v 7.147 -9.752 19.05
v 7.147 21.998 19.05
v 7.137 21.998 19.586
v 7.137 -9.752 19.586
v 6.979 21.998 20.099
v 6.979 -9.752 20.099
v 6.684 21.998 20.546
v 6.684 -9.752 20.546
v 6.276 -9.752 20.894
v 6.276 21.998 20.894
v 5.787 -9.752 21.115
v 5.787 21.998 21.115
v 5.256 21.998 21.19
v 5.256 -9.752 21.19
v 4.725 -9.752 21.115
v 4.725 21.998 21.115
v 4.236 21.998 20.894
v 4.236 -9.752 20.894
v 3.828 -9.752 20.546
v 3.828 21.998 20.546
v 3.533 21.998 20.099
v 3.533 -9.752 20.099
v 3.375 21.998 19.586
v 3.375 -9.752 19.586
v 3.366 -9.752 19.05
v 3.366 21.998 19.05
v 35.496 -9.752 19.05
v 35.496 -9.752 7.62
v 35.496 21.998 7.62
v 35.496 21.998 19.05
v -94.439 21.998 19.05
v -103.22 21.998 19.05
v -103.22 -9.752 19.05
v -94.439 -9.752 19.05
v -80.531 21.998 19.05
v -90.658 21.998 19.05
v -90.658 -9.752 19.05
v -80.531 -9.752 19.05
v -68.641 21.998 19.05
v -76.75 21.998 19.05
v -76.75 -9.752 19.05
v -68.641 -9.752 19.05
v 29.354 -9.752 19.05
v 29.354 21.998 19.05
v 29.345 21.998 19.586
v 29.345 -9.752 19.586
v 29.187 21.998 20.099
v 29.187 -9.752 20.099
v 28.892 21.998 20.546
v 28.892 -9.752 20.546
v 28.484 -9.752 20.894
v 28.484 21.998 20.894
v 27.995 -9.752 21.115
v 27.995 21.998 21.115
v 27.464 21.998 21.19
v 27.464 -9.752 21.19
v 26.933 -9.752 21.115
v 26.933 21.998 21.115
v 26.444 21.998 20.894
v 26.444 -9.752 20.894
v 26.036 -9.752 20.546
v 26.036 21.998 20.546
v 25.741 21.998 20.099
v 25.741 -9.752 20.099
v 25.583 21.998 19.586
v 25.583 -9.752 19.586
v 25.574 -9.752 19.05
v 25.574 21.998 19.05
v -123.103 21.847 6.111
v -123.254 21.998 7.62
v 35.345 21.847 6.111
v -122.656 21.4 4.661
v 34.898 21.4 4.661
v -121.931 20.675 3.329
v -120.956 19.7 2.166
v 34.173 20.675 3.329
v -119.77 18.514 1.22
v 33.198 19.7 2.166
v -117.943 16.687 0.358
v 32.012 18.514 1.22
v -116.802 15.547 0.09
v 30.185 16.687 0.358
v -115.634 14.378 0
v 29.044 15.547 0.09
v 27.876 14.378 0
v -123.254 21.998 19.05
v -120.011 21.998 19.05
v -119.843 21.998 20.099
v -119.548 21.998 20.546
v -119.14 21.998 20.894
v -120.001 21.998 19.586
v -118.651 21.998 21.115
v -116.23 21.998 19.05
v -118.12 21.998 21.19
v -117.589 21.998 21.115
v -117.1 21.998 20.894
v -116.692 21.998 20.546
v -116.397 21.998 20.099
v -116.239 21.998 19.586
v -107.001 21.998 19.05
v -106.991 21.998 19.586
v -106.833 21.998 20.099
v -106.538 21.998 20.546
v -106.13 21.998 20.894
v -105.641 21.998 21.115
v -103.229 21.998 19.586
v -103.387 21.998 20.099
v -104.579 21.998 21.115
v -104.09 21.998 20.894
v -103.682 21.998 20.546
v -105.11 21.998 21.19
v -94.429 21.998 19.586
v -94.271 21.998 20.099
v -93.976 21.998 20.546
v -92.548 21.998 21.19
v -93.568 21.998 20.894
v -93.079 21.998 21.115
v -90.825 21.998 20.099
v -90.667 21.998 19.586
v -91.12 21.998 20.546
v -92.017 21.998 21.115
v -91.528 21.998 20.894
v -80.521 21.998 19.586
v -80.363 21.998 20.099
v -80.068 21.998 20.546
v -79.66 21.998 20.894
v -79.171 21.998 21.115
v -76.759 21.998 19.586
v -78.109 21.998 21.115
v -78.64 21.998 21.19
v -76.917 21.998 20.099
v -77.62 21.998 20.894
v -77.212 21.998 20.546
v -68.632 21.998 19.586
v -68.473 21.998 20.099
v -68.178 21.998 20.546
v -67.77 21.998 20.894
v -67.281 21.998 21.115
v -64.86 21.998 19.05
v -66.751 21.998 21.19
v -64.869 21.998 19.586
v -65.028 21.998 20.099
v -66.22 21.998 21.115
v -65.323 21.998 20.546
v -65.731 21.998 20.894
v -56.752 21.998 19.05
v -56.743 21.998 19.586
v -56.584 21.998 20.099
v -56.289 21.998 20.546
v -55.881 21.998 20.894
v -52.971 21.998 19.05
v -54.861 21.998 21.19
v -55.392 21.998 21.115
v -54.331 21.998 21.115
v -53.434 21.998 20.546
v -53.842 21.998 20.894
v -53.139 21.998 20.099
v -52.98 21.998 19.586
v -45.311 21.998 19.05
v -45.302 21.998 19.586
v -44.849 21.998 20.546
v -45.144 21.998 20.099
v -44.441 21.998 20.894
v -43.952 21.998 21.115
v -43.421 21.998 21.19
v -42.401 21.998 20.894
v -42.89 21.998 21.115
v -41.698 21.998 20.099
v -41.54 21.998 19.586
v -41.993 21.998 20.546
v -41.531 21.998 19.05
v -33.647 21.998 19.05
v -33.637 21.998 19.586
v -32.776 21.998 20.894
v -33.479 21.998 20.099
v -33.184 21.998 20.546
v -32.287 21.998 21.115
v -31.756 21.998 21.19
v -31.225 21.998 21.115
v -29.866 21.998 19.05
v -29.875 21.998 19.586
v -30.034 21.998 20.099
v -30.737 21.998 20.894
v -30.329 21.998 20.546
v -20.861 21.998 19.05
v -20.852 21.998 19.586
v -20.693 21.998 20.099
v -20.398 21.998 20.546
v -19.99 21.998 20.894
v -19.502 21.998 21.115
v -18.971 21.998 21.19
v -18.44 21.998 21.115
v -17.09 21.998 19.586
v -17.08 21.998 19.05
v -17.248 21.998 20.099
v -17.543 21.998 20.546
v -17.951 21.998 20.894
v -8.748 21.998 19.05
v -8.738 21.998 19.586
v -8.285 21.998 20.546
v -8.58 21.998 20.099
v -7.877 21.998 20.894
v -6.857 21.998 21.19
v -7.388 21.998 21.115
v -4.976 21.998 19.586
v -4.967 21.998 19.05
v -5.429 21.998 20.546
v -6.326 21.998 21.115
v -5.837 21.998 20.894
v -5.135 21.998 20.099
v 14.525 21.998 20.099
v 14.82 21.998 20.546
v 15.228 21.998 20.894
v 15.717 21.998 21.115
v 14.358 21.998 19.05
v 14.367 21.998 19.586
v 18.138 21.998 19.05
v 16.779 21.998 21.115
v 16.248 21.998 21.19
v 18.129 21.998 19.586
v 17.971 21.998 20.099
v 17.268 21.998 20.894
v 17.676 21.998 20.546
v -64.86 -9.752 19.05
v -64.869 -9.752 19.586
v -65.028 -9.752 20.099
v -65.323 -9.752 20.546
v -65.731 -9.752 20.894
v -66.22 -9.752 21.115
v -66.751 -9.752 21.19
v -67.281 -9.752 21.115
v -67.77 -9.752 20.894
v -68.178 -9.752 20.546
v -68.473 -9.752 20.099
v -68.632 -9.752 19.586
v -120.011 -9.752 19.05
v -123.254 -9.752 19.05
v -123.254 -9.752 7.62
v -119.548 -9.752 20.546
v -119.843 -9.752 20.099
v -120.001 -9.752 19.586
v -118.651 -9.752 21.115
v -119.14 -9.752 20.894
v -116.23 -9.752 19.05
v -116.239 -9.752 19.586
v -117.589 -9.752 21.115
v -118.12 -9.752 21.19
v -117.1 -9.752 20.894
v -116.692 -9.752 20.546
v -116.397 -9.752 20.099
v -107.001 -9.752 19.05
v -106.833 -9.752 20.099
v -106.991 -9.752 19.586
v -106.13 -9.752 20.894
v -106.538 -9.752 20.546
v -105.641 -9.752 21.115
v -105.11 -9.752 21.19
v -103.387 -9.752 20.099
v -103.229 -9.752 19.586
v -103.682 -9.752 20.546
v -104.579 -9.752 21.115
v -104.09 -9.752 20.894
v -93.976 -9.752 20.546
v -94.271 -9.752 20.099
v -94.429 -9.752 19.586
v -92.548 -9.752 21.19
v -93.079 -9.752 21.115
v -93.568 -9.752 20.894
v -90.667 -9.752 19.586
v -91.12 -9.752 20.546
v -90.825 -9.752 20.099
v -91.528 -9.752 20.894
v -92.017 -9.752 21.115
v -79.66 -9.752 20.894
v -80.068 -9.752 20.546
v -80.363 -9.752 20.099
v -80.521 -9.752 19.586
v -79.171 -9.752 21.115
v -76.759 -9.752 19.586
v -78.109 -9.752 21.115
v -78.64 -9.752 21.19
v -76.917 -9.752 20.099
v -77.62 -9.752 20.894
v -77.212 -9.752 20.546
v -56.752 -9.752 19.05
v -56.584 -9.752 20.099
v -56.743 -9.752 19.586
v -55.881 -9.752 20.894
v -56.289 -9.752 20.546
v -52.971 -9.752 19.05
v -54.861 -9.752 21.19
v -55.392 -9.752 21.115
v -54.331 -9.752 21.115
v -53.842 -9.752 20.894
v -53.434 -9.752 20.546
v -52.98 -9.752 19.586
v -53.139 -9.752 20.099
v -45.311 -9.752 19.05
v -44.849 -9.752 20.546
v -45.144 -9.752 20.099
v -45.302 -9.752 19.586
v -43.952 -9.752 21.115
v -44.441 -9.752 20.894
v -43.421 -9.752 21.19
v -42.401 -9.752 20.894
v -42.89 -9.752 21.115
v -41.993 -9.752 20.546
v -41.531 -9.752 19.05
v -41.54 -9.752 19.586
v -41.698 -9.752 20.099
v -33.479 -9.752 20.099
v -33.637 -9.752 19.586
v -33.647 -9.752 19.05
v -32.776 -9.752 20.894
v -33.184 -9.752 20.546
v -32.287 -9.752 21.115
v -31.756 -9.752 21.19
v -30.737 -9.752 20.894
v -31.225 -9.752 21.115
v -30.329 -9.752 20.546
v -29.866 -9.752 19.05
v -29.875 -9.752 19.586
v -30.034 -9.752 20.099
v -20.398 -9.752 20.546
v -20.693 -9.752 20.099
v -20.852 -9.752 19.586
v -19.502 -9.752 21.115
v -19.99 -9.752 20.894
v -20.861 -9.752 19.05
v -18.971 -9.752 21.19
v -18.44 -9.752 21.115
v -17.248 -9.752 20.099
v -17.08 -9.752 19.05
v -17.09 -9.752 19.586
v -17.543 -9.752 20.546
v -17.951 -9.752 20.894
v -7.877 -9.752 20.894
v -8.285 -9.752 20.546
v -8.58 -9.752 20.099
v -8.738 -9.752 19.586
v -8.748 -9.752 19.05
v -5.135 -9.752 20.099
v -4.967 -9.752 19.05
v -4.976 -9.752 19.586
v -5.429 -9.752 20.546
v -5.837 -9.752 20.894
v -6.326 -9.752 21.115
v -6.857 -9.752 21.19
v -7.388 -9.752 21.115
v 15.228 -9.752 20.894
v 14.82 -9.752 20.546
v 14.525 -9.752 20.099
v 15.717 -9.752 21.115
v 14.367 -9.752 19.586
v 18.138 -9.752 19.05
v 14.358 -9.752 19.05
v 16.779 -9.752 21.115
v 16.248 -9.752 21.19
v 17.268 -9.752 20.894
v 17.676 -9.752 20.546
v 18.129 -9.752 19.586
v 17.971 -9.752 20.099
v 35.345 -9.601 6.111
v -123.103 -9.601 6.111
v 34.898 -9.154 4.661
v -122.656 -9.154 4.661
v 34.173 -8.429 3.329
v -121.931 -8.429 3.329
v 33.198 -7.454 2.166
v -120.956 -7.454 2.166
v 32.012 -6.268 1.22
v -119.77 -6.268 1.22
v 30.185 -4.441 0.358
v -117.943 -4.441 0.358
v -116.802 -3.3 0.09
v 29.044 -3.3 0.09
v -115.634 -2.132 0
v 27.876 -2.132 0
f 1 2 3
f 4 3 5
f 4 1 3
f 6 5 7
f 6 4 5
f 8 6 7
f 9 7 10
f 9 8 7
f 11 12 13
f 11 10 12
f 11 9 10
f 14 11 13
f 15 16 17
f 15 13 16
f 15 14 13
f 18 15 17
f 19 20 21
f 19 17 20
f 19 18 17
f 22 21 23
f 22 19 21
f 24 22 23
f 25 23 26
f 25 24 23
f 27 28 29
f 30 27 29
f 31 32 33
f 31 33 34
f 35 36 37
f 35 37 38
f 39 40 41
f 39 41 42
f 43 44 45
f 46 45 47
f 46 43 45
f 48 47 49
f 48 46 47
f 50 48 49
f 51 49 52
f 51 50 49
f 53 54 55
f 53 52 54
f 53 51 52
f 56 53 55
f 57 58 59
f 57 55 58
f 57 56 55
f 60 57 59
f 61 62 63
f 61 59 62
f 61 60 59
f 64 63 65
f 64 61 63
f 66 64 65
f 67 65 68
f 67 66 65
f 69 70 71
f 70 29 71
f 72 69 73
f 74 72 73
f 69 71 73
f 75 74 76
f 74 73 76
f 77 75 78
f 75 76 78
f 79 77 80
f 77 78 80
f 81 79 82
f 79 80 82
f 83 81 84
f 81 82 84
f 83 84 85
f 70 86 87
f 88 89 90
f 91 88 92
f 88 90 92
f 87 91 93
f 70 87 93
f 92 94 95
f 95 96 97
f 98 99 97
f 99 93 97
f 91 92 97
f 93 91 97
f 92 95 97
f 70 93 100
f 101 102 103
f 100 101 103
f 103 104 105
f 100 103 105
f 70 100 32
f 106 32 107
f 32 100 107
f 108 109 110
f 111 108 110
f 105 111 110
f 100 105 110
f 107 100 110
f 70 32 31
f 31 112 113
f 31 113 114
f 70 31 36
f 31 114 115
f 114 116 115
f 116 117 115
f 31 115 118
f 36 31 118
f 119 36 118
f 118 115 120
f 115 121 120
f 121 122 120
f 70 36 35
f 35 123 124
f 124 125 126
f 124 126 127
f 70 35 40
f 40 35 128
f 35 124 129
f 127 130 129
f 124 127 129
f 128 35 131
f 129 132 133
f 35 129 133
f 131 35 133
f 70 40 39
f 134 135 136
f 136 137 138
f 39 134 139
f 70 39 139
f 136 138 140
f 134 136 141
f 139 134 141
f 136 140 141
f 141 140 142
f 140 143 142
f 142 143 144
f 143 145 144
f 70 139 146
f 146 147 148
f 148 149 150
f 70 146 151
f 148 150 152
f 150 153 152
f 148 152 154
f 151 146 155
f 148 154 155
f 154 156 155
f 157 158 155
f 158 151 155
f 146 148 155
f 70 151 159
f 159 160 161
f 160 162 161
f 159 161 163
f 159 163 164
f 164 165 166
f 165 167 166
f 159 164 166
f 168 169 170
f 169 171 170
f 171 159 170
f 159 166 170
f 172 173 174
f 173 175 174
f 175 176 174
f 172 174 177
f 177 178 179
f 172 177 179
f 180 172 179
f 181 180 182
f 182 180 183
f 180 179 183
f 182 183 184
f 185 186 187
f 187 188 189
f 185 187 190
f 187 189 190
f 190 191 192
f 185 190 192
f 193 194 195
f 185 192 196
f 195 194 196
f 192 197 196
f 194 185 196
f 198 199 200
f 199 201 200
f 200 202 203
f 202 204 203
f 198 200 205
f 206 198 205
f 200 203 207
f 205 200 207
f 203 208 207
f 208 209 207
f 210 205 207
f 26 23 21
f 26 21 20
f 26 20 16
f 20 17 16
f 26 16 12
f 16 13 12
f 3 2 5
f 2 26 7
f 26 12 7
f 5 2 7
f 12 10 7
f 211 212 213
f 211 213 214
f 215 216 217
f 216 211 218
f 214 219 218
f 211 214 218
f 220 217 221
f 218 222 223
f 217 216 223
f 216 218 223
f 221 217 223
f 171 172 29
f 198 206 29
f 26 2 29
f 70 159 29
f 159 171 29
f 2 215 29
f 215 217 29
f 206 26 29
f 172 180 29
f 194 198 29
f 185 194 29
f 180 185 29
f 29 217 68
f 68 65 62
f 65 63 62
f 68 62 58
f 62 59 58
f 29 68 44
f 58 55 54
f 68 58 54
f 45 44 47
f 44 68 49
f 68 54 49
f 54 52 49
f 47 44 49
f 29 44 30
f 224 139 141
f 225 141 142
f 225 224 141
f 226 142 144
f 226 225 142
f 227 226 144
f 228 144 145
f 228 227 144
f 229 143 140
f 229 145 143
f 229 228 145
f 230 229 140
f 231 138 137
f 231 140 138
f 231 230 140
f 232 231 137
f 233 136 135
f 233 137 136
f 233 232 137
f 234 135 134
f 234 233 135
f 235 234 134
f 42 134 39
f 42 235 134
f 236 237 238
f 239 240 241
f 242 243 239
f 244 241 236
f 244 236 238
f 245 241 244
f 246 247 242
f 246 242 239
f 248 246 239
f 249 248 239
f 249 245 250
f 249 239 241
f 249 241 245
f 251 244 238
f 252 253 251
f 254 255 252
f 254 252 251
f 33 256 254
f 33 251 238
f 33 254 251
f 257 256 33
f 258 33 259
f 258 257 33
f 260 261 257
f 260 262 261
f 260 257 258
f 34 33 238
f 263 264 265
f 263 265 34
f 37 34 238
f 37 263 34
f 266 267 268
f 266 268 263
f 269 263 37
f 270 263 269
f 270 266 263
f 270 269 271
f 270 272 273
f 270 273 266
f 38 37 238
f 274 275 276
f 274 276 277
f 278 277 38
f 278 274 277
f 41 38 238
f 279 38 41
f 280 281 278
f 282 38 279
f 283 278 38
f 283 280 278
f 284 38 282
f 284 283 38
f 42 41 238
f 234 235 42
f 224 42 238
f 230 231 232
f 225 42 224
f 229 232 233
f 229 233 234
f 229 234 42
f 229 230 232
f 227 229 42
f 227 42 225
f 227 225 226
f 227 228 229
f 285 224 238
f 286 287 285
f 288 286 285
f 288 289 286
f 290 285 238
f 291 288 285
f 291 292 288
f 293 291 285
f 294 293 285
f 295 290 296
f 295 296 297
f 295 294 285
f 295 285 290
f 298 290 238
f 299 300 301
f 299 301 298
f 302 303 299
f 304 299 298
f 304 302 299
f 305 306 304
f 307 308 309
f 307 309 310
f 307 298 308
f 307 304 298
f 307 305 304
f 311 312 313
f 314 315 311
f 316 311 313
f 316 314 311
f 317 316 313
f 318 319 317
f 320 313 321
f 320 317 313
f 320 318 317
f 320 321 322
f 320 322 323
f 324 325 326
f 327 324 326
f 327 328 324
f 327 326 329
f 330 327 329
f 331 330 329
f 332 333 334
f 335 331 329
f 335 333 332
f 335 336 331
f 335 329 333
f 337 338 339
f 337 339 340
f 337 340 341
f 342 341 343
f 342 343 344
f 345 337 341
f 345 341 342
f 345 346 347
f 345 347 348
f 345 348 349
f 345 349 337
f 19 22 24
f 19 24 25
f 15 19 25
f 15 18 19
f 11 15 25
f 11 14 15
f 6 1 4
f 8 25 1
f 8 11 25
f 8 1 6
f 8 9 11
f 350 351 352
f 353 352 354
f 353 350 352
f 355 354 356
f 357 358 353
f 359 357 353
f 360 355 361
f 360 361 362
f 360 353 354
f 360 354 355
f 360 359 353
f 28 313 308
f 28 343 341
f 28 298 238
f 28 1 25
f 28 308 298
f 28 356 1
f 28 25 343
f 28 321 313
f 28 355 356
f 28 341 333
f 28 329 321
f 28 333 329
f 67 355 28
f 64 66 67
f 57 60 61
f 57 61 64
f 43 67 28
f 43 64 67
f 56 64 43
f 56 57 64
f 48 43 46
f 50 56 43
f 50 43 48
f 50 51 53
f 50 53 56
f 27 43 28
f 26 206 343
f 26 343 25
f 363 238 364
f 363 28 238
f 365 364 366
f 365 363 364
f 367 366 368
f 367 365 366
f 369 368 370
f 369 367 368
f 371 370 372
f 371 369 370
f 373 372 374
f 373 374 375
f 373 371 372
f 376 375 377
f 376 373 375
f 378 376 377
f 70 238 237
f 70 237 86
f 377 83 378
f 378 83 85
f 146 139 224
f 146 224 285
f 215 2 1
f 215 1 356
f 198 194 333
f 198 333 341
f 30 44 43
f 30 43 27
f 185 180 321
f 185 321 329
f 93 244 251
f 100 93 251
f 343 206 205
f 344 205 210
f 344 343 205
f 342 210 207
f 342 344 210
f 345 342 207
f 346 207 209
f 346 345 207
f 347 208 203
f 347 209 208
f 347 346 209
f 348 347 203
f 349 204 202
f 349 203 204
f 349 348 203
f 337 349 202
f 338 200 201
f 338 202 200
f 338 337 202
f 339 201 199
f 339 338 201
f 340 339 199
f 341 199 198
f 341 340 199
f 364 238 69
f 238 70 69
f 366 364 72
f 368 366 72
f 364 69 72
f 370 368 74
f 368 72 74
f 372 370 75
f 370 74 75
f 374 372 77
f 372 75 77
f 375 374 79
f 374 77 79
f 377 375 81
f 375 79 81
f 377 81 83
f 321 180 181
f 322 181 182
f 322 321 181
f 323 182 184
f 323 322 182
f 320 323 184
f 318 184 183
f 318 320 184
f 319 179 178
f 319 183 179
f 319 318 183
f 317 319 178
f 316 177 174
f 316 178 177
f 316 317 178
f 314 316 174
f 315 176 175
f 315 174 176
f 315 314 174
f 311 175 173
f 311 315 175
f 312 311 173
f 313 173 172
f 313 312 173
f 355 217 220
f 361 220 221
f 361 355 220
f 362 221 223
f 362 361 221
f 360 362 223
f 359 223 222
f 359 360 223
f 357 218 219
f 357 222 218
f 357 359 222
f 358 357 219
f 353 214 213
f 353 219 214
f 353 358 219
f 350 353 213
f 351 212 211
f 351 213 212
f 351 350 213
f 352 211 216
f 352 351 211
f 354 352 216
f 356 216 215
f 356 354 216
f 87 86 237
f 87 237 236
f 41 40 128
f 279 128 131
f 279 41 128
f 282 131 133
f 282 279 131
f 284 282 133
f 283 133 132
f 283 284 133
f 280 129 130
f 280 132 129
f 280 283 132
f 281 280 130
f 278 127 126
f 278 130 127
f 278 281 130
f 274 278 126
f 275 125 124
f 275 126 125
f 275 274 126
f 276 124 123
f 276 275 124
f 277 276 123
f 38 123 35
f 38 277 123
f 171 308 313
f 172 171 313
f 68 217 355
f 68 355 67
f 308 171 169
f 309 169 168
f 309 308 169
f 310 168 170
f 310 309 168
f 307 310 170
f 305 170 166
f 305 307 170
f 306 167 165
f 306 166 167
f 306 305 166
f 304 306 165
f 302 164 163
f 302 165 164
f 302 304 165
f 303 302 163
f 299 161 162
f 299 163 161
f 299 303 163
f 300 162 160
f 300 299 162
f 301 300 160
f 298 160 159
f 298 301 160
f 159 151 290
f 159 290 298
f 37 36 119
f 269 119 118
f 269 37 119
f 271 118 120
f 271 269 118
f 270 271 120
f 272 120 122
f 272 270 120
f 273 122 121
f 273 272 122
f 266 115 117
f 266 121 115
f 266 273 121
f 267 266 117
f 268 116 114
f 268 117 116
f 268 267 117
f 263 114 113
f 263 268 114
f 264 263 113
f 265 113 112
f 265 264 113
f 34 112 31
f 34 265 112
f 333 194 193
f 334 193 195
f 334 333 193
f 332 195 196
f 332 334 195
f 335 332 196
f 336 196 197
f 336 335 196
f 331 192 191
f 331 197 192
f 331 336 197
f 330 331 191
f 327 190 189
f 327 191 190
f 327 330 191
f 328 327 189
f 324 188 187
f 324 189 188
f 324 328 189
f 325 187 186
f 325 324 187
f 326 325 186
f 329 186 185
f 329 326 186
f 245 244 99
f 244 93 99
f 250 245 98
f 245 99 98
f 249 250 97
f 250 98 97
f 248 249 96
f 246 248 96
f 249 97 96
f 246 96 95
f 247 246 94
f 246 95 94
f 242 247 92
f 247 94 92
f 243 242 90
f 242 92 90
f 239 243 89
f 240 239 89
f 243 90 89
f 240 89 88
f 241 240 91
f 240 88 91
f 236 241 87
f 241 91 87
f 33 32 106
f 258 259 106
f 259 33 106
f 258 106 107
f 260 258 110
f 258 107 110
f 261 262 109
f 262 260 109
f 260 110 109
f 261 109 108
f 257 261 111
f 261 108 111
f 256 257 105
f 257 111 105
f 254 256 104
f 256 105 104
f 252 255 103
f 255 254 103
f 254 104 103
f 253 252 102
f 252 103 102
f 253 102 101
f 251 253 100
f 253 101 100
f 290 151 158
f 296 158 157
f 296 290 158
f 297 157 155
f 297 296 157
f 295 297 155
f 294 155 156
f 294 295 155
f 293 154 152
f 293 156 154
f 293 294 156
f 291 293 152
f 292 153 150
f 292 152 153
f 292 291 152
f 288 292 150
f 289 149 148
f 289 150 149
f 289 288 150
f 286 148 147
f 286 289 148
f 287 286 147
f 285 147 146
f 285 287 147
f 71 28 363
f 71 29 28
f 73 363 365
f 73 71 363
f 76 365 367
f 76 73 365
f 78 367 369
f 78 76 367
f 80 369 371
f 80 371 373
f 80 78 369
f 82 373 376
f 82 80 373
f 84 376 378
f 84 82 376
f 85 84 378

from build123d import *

# Parameters (mm, degrees)
F0_W          = 158.75
F0_H          = 31.75
F1_DEPTH      = 19.05
F3_R          = 7.62
F2_R          = 1.905
F4_DEPTH      = 21.9981725439
F4_DEPTH_BACK = 9.7518274561


with BuildPart() as f1:
    # F0 (on Top) → F1 (new body)
    with BuildSketch(Plane.XY):
        with Locations((-43.8790681958, 6.1231725439)):
            Rectangle(F0_W, F0_H)
    extrude(amount=F1_DEPTH)

    # F3
    f3_edges = [f1.edges().sort_by_distance(p)[0] for p in [
        (-43.879068, 21.998173, 0),
        (-123.254068, 6.123173, 0),
        (-43.879068, -9.751827, 0),
        (35.495932, 6.123173, 0),
    ]]
    fillet(f3_edges, radius=F3_R)

    # F2 (on Front) → F4 (join, two sides)
    with BuildSketch(Plane.XZ) as f4_sk:
        with Locations((-105.110168457, 19.2852988839)):
            Circle(F2_R)
        with Locations((-92.5481468439, 19.2852988839)):
            Circle(F2_R)
        with Locations((-78.6401927471, 19.2852988839)):
            Circle(F2_R)
        with Locations((-66.7505128102, 19.2852988839)):
            Circle(F2_R)
        with Locations((-54.8614611642, 19.2852988839)):
            Circle(F2_R)
        with Locations((-43.4210499542, 19.2852988839)):
            Circle(F2_R)
        with Locations((-31.7563166635, 19.2852988839)):
            Circle(F2_R)
        with Locations((-18.9705938101, 19.2852988839)):
            Circle(F2_R)
        with Locations((-6.8572163582, 19.2852988839)):
            Circle(F2_R)
        with Locations((-118.1202022152, 19.2852988839)):
            Circle(F2_R)
        with Locations((5.2561564371, 19.2852988839)):
            Circle(F2_R)
        with Locations((16.2479281425, 19.2852988839)):
            Circle(F2_R)
        with Locations((27.4640191346, 19.2852988839)):
            Circle(F2_R)
    extrude(amount=-F4_DEPTH)
    extrude(f4_sk.sketch, amount=F4_DEPTH_BACK)


solid = f1.part
